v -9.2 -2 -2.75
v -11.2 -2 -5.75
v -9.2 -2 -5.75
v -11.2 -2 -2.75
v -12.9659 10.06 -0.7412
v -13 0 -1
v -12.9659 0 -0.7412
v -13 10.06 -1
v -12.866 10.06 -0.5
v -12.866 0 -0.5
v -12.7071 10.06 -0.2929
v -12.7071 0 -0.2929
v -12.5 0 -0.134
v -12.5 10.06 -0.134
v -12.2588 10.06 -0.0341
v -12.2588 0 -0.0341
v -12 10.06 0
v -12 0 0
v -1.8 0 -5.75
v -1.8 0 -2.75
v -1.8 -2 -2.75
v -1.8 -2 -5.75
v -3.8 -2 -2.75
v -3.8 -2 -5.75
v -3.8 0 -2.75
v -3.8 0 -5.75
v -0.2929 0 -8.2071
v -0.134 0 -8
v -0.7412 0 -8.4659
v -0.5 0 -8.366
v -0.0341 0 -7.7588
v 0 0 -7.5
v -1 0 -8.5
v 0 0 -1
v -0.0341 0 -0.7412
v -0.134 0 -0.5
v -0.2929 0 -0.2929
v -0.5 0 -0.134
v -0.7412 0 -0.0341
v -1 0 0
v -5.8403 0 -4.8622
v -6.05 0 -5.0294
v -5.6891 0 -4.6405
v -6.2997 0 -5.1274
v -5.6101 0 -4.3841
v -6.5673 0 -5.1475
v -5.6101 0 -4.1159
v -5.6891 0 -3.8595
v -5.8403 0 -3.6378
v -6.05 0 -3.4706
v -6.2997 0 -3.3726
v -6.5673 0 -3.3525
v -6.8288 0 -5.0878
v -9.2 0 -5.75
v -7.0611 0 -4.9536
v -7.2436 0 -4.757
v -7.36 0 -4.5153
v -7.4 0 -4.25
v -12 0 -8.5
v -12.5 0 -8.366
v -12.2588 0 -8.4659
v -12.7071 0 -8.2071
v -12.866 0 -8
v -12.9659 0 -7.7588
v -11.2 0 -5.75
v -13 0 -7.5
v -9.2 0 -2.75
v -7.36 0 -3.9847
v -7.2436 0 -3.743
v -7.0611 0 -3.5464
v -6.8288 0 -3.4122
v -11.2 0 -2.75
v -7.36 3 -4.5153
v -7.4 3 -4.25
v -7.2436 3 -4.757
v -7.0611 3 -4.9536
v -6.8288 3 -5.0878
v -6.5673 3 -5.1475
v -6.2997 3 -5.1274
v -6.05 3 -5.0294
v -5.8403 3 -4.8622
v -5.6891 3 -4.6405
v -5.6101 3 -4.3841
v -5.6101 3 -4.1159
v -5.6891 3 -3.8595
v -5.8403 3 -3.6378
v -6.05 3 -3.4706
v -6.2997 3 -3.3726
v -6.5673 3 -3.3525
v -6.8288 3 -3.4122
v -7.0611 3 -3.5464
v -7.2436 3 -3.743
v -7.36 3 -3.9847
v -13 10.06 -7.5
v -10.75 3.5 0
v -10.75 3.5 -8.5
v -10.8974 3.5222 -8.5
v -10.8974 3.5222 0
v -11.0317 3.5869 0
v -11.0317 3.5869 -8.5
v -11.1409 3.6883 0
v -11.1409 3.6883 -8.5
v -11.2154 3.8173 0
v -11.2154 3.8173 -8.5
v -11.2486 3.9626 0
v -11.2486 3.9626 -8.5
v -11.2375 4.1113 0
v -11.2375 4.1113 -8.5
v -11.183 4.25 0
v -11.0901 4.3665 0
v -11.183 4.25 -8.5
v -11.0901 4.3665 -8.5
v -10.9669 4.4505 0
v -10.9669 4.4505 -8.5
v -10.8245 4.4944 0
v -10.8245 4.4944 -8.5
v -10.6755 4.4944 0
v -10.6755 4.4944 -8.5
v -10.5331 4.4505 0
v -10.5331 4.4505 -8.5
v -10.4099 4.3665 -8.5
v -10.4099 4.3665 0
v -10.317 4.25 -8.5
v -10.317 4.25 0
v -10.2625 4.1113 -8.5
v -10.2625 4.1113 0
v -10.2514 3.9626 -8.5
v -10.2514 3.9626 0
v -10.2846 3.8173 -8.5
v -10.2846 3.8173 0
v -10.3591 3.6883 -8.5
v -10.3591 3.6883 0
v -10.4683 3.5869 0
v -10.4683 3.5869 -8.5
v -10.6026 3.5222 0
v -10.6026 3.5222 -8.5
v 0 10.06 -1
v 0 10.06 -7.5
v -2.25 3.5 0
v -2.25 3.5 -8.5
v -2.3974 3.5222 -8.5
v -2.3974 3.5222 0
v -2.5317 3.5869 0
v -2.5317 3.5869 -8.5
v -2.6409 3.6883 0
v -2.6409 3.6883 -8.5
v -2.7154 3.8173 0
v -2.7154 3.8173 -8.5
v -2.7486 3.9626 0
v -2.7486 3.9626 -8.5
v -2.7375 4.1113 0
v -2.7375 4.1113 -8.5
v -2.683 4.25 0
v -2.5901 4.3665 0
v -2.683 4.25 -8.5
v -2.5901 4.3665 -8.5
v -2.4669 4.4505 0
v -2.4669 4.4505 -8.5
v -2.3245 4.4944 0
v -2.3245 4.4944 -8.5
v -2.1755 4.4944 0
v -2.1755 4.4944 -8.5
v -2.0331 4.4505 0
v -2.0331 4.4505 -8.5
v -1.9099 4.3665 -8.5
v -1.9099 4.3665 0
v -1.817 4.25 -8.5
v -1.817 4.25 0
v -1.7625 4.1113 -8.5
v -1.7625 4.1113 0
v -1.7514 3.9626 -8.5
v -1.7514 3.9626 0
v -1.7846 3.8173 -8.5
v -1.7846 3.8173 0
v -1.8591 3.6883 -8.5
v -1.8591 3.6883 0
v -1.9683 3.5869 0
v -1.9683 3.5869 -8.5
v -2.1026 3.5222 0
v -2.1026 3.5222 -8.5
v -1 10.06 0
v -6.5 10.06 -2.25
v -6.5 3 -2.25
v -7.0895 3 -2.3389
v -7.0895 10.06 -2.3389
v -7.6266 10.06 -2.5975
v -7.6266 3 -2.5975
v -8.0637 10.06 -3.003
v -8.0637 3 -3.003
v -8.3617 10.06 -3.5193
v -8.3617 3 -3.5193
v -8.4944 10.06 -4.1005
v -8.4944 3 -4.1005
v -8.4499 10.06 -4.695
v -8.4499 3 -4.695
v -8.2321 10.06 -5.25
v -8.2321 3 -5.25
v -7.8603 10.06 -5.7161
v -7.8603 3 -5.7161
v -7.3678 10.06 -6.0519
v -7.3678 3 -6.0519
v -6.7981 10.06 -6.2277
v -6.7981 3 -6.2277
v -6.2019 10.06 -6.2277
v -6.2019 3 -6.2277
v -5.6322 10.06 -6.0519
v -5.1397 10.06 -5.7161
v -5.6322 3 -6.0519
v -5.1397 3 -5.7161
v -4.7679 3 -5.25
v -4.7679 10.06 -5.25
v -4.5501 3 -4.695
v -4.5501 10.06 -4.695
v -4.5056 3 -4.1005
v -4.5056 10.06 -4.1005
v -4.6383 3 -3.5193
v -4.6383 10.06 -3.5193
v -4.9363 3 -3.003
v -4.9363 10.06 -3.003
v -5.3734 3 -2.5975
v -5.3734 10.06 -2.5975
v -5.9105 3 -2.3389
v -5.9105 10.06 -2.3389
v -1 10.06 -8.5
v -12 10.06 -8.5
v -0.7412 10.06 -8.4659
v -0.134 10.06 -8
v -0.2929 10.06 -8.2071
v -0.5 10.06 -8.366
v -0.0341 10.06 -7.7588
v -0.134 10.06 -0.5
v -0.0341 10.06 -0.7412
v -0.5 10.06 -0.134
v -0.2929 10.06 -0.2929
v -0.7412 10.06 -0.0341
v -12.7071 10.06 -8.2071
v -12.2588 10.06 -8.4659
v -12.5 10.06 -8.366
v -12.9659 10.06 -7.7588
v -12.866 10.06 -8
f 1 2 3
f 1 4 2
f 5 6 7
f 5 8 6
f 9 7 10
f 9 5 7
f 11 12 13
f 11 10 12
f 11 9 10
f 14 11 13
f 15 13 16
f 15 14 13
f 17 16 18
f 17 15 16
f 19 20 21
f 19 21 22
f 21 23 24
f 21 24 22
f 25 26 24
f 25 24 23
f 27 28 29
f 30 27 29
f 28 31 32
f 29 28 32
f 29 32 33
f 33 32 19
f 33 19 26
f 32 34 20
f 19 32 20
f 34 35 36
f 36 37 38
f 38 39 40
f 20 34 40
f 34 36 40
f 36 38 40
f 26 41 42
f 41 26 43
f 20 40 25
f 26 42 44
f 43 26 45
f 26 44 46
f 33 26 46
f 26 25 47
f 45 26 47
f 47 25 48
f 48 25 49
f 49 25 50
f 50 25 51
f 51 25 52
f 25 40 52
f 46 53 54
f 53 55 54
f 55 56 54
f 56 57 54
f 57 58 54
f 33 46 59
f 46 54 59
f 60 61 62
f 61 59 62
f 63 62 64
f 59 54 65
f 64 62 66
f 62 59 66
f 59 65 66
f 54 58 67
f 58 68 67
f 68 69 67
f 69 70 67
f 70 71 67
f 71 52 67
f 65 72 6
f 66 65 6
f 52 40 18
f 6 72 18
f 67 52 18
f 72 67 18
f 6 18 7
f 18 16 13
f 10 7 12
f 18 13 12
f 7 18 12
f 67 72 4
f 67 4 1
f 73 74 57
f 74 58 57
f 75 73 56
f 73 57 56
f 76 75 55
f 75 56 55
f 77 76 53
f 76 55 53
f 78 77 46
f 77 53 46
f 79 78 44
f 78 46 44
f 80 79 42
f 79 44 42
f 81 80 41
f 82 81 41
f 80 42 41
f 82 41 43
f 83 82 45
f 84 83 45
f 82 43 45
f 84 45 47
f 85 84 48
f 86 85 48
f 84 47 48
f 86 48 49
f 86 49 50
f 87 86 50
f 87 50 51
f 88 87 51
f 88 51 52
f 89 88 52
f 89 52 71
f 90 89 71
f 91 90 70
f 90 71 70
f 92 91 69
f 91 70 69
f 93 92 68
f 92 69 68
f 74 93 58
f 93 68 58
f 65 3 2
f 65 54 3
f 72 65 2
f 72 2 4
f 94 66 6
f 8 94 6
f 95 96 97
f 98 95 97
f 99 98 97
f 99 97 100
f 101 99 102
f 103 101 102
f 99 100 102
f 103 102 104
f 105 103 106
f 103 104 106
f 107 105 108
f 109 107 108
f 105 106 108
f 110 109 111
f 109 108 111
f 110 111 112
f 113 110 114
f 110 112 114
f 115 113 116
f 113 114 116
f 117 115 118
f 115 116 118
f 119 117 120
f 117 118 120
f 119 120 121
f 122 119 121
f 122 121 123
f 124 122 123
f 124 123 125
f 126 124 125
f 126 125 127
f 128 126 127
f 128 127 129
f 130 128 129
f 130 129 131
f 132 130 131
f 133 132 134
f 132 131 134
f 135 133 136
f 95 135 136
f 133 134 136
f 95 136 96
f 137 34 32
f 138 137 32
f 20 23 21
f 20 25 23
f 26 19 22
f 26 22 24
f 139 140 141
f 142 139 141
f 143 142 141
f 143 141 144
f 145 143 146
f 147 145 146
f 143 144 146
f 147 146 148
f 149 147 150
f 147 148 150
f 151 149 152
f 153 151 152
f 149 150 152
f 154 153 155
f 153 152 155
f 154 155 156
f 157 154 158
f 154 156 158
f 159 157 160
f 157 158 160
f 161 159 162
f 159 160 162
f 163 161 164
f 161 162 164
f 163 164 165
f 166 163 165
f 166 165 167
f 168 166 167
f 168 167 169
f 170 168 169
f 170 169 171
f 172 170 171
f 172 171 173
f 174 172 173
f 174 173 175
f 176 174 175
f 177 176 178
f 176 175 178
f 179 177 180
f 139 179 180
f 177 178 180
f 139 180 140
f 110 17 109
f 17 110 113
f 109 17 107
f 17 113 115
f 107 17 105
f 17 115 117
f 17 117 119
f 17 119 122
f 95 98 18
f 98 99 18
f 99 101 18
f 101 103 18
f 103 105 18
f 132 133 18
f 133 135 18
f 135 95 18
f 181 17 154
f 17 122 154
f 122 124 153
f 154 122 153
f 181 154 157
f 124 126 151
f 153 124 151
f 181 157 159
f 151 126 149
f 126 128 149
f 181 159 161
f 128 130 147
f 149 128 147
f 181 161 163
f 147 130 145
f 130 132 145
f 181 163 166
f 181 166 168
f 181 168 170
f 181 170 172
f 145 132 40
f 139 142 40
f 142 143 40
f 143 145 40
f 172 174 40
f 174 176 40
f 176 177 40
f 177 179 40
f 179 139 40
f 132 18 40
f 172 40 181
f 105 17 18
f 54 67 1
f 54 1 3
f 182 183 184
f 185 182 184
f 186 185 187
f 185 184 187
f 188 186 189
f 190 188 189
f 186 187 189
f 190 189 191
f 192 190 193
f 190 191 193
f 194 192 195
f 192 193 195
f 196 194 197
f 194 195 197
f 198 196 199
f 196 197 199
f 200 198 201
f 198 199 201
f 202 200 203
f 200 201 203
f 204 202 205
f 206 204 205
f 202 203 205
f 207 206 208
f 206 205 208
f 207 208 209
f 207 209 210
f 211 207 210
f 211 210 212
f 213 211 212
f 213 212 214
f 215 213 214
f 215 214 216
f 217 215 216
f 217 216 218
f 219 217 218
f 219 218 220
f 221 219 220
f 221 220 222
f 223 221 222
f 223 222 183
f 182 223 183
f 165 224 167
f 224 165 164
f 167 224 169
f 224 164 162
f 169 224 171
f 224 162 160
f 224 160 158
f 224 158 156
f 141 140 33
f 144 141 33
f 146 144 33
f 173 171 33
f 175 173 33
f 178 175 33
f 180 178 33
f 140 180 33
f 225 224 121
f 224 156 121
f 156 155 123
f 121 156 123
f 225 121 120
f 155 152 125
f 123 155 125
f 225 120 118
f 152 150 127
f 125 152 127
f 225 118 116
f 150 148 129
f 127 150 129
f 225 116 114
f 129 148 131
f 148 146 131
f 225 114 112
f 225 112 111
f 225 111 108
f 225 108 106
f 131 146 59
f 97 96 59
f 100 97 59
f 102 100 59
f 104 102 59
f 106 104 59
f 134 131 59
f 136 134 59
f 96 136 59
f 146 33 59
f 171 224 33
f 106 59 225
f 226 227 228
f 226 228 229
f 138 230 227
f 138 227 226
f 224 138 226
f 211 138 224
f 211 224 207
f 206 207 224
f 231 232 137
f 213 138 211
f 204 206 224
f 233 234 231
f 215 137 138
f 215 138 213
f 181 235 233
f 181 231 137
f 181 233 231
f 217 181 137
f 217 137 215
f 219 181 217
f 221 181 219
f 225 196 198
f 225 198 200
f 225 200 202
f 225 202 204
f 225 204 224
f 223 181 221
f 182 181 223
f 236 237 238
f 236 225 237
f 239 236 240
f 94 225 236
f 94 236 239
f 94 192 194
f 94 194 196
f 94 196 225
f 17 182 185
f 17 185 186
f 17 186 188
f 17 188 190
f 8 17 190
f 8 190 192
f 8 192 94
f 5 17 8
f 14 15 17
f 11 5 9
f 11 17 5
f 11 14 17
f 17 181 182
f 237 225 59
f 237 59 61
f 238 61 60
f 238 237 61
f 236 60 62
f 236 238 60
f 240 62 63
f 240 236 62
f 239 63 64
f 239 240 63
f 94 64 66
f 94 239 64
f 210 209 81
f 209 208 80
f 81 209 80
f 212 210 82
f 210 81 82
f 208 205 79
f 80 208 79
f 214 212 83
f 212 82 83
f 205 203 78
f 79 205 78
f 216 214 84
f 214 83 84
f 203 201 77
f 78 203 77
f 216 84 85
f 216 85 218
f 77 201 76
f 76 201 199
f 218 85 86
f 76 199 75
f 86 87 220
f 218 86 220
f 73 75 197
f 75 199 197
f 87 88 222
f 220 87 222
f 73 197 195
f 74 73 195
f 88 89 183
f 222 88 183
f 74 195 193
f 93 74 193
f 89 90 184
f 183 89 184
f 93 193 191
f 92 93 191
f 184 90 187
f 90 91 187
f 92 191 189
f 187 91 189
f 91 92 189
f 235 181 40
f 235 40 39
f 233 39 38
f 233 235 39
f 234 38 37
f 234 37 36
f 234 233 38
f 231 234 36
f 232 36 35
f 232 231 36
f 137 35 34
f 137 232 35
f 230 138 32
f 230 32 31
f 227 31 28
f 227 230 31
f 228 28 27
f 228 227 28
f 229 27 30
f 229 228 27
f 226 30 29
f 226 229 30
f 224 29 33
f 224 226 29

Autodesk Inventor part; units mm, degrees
ref_plane "YZ Plane" through (0, 0, 0) normal (1, 0, 0) x (0, 1, 0)
ref_plane "XZ Plane" through (0, 0, 0) normal (0, 1, 0) x (-1, 0, 0)
ref_plane "XY Plane" through (0, 0, 0) normal (0, 0, 1) x (1, 0, 0)
sketch "Boceto1" plane through (0, 0, 0) normal (0, 1, 0) x (-1, 0, 0)
  line L0 (0, 0) -> (0, -8.5)
  line L1 (0, -8.5) -> (13, -8.5)
  line L2 (13, -8.5) -> (13, 0)
  line L3 (13, 0) -> (0, 0)
  circle A0 centre (6.5, -4.25) radius 0.9
  dimension "d0" = 8.5
  dimension "d1" = 13
  dimension "d2" = 1.8
  dimension "d13" = 4.25
extrude "Extrusión1" add sketch "Boceto1" along normal blind 10.06
sketch "Boceto2" plane through (0, 10.06, 0) normal (0, 1, 0) x (1, 0, 0)
  circle A0 centre (-6.5, 4.25) radius 0.9 projected
  point P0 (0, 0)
hole "Agujero1" at (-6.5, 10.06, -4.25) direction (0, -1, 0) diameter 4 depth 7.06
fillet "Empalme1" radius 1 4 edges at (0, 5.03, 0) (0, 5.03, -8.5) (-13, 5.03, 0) (-13, 5.03, -8.5)
sketch "Boceto3" plane through (0, 0, 0) normal (0, -1, 0) x (1, 0, 0)
  line L0 (-1.8, -5.75) -> (-3.8, -5.75)
  line L1 (-3.8, -5.75) -> (-3.8, -2.75)
  line L2 (-3.8, -2.75) -> (-1.8, -2.75)
  line L3 (-1.8, -2.75) -> (-1.8, -5.75)
  line L4 (0, -1) -> (0, -7.5) projected
  line L5 (-1, -8.5) -> (-12, -8.5) projected
  line L6 (-9.2, -5.75) -> (-11.2, -5.75)
  line L7 (-11.2, -5.75) -> (-11.2, -2.75)
  line L8 (-11.2, -2.75) -> (-9.2, -2.75)
  line L9 (-9.2, -2.75) -> (-9.2, -5.75)
  line L10 (-12, 0) -> (-1, 0) projected
  line L11 (-13, -7.5) -> (-13, -1) projected
  point P0 (0, 0)
  dimension "d14" = 2
  dimension "d15" = 3
  dimension "d16" = 1.8
  dimension "d17" = 2.75
  dimension "d18" = 2
  dimension "d19" = 3
  dimension "d20" = 2.75
  dimension "d21" = 1.8
extrude "Extrusión2" add sketch "Boceto3" along normal blind 2
sketch "Boceto4" plane through (-12, 0, 0) normal (0, 0, 1) x (1, 0, 0)
  circle A0 centre (1.25, 4) radius 0.5
  circle A1 centre (9.75, 4) radius 0.5
  line L0 (-1, 10.06) -> (-1, 0) projected
  line L1 (12, 0) -> (12, 10.06) projected
  line L2 (0, 0) -> (11, 0) projected
  dimension "d24" = 1
  dimension "d25" = 1
  dimension "d26" = 2.25
  dimension "d27" = 2.25
  dimension "d28" = 4
  dimension "d29" = 4
hole "Agujero2" at (-10.75, 4, 0) at (-2.25, 4, 0) direction (0, 0, -1) diameter 1 end through all
properties part number "Soporte placa 2.0"
